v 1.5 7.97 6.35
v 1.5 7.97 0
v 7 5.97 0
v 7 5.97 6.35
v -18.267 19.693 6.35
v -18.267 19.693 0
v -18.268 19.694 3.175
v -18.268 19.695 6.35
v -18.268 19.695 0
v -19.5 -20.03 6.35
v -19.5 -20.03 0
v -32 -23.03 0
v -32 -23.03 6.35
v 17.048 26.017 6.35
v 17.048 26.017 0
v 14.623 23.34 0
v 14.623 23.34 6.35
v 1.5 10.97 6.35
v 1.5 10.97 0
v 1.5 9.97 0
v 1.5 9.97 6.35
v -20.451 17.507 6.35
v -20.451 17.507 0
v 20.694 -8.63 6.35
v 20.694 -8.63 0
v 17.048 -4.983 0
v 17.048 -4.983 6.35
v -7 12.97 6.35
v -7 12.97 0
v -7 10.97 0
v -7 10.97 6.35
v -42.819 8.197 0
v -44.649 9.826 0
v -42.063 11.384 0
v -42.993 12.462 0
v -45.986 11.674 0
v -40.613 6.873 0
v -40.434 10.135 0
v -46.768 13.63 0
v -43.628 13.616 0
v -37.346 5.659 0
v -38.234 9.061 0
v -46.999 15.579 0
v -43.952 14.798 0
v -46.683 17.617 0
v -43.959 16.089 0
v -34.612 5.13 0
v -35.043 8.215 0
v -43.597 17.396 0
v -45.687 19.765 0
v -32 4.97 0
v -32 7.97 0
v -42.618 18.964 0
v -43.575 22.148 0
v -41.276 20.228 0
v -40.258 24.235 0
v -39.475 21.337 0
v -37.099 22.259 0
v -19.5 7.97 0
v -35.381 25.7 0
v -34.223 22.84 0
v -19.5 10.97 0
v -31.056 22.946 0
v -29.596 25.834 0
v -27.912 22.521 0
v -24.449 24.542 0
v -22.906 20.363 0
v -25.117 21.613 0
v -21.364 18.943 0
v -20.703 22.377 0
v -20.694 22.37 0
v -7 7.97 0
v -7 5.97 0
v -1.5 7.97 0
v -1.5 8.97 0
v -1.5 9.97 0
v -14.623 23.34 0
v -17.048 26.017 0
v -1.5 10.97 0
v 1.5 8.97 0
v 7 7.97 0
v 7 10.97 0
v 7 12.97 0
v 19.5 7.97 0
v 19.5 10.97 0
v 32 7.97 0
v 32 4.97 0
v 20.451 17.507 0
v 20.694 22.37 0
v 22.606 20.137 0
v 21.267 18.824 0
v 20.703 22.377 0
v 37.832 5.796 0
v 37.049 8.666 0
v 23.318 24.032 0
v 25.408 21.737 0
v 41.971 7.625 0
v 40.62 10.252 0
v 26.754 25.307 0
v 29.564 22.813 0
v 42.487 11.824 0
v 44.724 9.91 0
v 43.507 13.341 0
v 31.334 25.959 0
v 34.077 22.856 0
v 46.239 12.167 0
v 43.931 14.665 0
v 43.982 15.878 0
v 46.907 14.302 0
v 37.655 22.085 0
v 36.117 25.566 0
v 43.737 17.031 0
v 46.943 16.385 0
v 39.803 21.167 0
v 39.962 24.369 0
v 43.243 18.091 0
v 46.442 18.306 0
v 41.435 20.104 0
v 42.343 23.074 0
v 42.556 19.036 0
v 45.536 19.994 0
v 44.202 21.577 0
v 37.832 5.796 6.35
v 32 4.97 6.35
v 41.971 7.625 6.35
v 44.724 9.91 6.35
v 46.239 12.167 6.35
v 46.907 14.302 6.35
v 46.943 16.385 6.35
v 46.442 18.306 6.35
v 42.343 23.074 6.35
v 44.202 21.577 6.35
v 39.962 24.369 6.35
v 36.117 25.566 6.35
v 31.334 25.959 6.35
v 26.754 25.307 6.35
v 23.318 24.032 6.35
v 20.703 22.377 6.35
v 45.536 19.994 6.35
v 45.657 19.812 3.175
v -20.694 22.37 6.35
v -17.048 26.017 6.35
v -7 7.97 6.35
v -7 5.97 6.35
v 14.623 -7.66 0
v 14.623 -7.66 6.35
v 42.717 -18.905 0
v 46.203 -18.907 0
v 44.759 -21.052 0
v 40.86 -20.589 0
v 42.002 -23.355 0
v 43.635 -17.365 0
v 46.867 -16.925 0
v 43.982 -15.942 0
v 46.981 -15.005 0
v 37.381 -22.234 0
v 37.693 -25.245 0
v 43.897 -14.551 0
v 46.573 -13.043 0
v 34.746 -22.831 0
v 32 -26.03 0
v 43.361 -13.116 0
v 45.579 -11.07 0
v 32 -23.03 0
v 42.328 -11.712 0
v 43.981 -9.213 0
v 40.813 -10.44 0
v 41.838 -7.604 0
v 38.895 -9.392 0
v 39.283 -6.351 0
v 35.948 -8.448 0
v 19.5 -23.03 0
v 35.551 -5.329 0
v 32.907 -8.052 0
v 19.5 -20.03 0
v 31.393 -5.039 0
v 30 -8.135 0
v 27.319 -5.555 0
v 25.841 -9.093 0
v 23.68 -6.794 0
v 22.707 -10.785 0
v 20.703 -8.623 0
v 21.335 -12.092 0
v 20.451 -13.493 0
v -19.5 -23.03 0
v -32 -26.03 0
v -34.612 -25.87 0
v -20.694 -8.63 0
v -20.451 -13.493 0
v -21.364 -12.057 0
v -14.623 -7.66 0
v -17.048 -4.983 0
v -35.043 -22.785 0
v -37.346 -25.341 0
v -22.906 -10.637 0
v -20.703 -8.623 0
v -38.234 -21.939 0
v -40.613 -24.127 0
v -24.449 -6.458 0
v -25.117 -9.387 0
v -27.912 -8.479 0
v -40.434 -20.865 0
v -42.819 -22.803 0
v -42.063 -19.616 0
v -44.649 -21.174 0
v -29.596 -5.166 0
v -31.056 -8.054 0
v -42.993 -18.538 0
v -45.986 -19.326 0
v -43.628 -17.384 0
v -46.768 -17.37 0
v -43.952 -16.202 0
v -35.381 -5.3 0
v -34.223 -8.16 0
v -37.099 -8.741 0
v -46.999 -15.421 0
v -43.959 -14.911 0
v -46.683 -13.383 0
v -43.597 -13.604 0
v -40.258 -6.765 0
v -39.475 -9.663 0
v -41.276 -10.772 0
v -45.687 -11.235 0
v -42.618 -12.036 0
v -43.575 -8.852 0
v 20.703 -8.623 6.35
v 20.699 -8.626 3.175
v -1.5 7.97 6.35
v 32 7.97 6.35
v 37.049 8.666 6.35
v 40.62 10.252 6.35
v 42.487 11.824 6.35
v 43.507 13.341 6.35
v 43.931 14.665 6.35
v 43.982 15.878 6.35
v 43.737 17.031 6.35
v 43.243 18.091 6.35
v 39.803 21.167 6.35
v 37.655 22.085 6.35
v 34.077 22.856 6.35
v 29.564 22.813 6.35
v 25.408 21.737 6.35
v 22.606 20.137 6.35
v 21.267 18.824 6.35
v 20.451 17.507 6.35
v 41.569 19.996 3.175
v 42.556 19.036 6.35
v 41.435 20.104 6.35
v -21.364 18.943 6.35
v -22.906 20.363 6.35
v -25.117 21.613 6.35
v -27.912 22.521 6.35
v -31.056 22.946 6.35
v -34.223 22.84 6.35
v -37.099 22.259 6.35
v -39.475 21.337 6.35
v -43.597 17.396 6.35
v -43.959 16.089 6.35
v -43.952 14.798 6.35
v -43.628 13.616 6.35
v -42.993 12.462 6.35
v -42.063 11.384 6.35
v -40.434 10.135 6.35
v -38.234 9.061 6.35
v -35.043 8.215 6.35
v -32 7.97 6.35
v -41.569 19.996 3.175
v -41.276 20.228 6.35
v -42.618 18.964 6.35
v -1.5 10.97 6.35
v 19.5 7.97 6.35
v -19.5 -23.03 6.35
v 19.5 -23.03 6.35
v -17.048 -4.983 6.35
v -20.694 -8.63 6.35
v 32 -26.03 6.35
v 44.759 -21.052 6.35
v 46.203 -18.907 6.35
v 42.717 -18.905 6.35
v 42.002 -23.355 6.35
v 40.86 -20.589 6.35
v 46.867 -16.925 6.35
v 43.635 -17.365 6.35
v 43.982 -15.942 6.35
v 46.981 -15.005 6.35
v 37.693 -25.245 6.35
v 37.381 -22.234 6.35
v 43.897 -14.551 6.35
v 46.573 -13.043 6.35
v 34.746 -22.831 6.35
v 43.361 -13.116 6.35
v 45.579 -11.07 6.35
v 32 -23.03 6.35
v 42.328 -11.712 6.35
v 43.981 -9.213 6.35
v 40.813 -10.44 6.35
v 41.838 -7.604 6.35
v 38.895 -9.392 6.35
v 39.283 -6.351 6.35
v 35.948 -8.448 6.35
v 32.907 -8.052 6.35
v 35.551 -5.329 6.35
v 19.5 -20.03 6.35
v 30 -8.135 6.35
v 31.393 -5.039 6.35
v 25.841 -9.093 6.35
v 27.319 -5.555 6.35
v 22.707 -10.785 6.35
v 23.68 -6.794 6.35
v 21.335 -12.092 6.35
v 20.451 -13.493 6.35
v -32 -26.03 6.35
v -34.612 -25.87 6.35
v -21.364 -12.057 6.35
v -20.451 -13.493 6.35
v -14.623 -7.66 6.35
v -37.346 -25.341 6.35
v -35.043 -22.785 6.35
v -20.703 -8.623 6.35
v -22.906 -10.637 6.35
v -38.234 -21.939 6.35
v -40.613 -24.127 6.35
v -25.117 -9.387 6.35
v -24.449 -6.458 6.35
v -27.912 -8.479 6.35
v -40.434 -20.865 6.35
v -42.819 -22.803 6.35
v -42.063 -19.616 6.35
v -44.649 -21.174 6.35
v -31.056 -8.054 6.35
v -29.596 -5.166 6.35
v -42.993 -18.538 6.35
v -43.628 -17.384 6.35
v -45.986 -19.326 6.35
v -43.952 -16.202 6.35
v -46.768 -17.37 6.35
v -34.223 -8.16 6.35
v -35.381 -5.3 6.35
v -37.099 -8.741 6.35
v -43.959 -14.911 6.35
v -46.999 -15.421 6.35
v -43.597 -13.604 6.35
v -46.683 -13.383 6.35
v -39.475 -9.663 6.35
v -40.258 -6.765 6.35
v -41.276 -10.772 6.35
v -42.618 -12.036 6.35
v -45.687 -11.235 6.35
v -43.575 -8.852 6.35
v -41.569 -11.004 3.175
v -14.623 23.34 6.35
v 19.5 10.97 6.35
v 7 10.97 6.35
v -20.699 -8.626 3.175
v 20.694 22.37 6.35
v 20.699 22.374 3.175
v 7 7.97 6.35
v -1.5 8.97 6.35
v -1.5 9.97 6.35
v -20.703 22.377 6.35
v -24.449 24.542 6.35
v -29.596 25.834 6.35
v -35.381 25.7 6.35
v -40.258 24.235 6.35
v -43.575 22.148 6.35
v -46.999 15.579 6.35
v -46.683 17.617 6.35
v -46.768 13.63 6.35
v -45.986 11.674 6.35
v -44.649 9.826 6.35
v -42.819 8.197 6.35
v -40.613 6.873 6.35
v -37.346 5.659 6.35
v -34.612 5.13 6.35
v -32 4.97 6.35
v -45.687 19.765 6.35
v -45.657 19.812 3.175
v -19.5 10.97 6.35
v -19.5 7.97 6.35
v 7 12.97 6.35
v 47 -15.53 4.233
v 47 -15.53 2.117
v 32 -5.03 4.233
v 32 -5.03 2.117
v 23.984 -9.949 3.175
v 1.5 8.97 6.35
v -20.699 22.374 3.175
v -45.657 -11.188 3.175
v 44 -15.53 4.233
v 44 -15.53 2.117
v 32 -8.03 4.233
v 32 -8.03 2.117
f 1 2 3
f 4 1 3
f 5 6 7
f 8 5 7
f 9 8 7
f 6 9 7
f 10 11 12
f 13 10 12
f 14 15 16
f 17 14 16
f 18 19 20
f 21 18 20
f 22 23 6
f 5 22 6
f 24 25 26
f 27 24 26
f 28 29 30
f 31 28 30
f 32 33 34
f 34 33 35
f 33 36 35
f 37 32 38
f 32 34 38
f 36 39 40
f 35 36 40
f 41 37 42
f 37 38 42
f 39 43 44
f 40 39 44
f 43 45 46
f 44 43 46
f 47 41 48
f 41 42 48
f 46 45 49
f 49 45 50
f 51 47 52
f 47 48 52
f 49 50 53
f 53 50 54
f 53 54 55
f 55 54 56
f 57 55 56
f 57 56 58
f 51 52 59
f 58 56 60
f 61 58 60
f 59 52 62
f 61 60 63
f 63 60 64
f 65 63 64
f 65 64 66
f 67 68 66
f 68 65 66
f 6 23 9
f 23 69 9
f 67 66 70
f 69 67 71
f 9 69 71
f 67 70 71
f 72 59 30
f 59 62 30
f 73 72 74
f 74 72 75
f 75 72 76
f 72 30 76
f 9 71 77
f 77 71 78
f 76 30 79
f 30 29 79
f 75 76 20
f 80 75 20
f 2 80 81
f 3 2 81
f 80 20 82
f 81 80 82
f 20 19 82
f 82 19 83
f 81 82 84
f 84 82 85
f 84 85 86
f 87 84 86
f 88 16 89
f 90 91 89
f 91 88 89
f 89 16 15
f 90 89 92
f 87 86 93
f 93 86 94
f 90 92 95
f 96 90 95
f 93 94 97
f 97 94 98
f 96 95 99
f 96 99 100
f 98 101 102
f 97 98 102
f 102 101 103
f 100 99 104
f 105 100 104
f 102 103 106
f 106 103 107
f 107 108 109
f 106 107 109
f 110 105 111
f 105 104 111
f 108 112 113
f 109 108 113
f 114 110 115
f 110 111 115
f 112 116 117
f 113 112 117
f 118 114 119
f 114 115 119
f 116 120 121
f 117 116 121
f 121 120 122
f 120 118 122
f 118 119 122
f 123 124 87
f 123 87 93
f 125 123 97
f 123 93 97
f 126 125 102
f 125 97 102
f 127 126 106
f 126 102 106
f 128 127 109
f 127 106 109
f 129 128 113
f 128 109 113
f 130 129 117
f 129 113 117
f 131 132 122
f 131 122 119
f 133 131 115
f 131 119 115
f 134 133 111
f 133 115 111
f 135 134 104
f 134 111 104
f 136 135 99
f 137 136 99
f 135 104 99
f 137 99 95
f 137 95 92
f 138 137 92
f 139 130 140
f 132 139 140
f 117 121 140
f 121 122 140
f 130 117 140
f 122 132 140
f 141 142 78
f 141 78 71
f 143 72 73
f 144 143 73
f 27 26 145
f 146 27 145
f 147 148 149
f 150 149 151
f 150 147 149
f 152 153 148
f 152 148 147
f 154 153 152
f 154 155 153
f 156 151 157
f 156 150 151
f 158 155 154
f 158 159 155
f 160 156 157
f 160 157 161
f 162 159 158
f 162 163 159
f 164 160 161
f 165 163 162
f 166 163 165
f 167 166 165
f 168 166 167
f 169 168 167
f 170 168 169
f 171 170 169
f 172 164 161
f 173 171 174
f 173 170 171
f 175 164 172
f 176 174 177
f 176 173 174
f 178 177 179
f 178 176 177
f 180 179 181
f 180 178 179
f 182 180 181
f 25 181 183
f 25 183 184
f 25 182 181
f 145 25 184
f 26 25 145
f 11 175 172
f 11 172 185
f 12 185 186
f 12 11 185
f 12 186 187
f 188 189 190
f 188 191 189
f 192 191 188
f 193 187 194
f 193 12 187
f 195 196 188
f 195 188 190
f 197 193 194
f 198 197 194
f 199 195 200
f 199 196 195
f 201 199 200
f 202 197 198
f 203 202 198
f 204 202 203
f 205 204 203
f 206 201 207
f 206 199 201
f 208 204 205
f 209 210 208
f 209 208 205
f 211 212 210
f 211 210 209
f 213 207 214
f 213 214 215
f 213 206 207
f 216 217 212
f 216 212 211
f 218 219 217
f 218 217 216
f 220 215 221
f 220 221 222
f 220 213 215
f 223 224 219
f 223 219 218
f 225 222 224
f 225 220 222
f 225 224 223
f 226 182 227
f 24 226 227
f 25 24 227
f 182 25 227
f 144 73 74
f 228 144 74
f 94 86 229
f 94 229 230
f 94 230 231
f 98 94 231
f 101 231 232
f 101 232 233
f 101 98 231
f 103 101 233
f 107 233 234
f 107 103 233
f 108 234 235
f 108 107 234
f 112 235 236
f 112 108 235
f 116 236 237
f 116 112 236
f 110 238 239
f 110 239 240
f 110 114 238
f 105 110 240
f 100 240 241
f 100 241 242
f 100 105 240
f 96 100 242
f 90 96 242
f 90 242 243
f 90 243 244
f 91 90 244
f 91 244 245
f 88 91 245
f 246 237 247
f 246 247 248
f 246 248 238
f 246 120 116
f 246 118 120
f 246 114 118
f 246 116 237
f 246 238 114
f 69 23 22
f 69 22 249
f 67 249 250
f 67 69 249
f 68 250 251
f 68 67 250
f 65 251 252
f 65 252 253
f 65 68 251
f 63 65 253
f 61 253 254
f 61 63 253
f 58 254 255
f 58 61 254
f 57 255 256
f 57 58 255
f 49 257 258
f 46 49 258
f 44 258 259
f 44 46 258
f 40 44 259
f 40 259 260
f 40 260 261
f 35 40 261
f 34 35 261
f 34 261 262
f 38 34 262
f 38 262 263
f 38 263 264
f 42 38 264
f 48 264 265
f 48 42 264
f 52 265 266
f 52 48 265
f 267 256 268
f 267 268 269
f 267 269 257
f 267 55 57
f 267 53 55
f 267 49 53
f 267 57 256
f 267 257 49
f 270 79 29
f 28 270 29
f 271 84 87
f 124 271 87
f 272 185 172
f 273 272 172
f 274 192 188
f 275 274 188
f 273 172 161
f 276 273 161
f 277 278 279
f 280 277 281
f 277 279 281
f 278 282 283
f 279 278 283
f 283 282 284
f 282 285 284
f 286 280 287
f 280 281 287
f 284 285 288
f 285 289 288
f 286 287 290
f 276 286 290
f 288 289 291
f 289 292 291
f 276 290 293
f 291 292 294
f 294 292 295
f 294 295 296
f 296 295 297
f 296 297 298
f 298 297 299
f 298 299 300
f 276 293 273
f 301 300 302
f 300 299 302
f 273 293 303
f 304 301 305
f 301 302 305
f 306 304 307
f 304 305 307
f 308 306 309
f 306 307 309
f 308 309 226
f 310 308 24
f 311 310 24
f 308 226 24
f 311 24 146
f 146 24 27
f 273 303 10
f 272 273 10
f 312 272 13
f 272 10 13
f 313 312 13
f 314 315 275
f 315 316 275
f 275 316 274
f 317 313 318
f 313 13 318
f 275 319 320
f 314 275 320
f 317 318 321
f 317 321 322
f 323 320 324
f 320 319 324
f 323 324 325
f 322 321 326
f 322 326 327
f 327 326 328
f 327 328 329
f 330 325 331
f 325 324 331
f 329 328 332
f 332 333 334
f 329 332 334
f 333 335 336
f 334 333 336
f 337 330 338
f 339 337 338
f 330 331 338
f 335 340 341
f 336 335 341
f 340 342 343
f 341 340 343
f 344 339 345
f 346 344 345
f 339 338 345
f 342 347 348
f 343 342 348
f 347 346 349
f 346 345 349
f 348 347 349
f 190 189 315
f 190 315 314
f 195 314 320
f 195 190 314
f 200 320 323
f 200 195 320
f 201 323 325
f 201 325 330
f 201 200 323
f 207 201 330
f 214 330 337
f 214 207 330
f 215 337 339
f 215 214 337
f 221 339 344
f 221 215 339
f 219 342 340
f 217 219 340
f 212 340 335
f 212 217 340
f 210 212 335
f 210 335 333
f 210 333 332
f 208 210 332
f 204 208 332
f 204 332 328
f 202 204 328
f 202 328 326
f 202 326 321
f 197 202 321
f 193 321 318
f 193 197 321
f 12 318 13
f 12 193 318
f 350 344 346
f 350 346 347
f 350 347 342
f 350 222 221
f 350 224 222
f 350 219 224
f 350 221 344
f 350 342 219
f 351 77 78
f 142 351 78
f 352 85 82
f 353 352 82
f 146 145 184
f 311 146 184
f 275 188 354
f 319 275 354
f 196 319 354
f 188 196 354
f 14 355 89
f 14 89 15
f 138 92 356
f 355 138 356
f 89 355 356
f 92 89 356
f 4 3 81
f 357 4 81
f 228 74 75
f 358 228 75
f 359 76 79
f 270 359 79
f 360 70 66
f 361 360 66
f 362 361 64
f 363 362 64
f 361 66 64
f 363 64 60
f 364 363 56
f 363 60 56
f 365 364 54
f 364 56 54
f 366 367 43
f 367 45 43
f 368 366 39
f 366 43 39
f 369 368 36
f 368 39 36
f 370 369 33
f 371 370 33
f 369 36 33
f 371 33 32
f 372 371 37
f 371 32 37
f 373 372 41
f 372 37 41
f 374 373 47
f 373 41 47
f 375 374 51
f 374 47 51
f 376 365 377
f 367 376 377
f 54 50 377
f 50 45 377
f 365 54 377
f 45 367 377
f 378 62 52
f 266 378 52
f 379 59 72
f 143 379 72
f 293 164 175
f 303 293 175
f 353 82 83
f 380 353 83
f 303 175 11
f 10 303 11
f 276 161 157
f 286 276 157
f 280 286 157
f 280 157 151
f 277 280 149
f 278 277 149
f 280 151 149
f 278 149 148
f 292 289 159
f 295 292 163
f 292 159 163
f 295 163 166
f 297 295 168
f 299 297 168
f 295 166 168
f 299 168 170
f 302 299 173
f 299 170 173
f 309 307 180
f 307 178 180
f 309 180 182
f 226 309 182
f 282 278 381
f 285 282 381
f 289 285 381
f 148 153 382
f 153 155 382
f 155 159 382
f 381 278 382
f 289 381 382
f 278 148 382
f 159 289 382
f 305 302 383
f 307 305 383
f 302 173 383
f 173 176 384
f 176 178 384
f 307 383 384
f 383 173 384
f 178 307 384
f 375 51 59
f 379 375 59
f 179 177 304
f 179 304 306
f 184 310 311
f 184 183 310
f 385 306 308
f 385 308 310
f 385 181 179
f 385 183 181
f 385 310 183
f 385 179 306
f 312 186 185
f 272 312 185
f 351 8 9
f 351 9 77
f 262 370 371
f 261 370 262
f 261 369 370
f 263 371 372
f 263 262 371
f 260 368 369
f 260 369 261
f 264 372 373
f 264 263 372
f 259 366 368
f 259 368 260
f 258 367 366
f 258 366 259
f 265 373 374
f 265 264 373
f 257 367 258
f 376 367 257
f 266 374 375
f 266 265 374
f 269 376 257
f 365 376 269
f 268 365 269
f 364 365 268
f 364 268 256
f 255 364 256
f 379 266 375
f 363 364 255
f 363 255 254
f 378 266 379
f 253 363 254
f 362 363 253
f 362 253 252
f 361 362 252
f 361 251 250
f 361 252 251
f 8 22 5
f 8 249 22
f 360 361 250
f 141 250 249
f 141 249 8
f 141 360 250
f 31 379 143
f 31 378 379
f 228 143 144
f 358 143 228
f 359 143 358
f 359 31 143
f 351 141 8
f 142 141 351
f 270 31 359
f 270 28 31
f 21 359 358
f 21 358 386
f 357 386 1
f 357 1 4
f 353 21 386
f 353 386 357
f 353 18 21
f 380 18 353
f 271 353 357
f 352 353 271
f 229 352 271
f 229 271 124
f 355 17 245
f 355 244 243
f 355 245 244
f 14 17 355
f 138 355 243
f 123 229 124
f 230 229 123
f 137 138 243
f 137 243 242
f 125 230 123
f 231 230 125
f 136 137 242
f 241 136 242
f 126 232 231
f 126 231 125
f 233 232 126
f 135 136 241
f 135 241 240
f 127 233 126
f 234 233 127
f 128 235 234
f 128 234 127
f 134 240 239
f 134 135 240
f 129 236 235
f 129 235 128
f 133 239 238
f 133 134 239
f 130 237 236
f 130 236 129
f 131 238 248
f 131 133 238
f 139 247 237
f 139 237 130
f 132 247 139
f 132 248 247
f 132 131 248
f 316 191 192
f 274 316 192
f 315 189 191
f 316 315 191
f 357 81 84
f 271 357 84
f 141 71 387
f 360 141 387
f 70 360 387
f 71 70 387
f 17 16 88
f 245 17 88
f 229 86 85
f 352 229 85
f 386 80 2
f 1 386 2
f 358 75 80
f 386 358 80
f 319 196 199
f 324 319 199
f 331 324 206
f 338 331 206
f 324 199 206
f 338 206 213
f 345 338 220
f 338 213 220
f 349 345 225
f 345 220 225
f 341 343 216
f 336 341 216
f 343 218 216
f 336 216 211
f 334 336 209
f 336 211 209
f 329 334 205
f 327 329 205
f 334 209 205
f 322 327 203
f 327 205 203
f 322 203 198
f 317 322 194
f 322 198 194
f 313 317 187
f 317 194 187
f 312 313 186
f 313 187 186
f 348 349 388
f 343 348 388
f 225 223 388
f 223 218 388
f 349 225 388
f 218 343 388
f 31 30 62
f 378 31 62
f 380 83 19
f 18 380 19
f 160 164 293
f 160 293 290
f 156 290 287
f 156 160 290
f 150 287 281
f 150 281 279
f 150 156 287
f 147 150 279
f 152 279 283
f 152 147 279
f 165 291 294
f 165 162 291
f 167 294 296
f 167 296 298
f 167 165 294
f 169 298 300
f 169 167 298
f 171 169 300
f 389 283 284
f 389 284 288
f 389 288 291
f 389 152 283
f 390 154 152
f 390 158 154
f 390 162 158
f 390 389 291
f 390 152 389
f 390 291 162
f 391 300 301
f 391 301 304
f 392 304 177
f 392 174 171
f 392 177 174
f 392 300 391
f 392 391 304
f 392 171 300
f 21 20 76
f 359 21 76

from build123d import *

# Parameters (mm, degrees)
F1_DEPTH = 6.35
F2_DEPTH = 6.35


# Not quite as in the source:
# - ends of sketch curves that miss each other by under 0.0002 mm in the source are joined


with BuildPart() as f1:
    # F0 (on Top) → F1 (new body)
    with BuildSketch(Plane.XY):
        with BuildLine():
            add(Edge.make_bspline(
                [(-20.4512735689, -13.4928953942), (-27.006583317, 1.0216576775), (-41.568666167, -11.0043361613), (-56.130749017, -23.03033), (-32, -23.03033)],
                knots=[3.416708, 3.416708, 3.416708, 5.635344817, 5.635344817, 7.853981634, 7.853981634, 7.853981634], degree=2, weights=[1, 0.445271914, 1, 0.445271914, 1]))
            Line((-20.4512735689, -13.4928953942), (-14.623441, -7.659787))
            Line((-14.623441, -7.659787), (-17.0484084715, -4.9831928082))
            Line((-17.0484084715, -4.9831928082), (-20.6942287896, -8.6297607204))
            add(Edge.make_bspline(
                [(-20.6942287896, -8.6297607204), (-20.698607878, -8.6262451494), (-20.7029914266, -8.6227323031)],
                knots=[3.8586865618, 3.8586865618, 3.8586865618, 3.859575, 3.859575, 3.859575], degree=2, weights=[1, 0.9999999013, 1]))
            add(Edge.make_bspline(
                [(-20.7029914266, -8.6227323031), (-36.0243090451, 3.6553185791), (-45.6568538904, -11.1875086941), (-55.2893987358, -26.0303359672), (-31.9999945096, -26.03033)],
                knots=[3.859575, 3.859575, 3.859575, 5.8567785, 5.8567785, 7.853982, 7.853982, 7.853982], degree=2, weights=[1, 0.5414783641, 1, 0.5414783641, 1]))
            Line((-31.9999945096, -26.03033), (-19.5, -23.03033))
            Line((-19.5, -23.03033), (0, -23.03033))
            Line((0, -23.03033), (19.5, -23.03033))
            Line((19.5, -23.03033), (32, -26.03033))
            add(Edge.make_bspline(
                [(32, -26.03033), (46.9999832548, -26.0303338433), (46.999986, -15.5303319216), (46.9999887452, -5.03033), (32, -5.03033)],
                knots=[4.7123886144, 4.7123886144, 4.7123886144, 6.2831851242, 6.2831851242, 7.853981634, 7.853981634, 7.853981634], degree=2, weights=[1, 0.7071067165, 1, 0.7071067165, 1]))
            add(Edge.make_bspline(
                [(32, -5.03033), (25.1858150627, -5.03033), (20.7029914266, -8.6227323031)],
                knots=[1.5707963268, 1.5707963268, 1.5707963268, 2.4236103072, 2.4236103072, 2.4236103072], degree=2, weights=[1, 0.9104577001, 1]))
            add(Edge.make_bspline(
                [(20.7029914266, -8.6227323031), (20.698607878, -8.6262451494), (20.6942287896, -8.6297607204)],
                knots=[2.4236103072, 2.4236103072, 2.4236103072, 2.4244987453, 2.4244987453, 2.4244987453], degree=2, weights=[1, 0.9999999013, 1]))
            Line((20.6942287896, -8.6297607204), (17.0484127896, -4.9831967204))
            Line((17.0484127896, -4.9831967204), (14.623441, -7.659787))
            Line((14.623441, -7.659787), (20.4512735689, -13.4928953942))
            add(Edge.make_bspline(
                [(30.0004237684, -8.1351855073), (22.5138875018, -8.9259228869), (20.4512735689, -13.4928953942)],
                knots=[1.7382085912, 1.7382085912, 1.7382085912, 2.8664773072, 2.8664773072, 2.8664773072], degree=2, weights=[1, 0.8450517623, 1]))
            add(Edge.make_bspline(
                [(32, -8.03033), (30.9931737994, -8.03033), (30.0004237684, -8.1351855073)],
                knots=[1.5707963268, 1.5707963268, 1.5707963268, 1.7382085912, 1.7382085912, 1.7382085912], degree=2, weights=[1, 0.9964986868, 1]))
            add(Edge.make_bspline(
                [(32, -23.03033), (44, -23.03033), (44, -15.53033), (44, -8.03033), (32, -8.03033)],
                knots=[4.7123889804, 4.7123889804, 4.7123889804, 6.2831853072, 6.2831853072, 7.853981634, 7.853981634, 7.853981634], degree=2, weights=[1, 0.7071067812, 1, 0.7071067812, 1]))
            Line((32, -23.03033), (19.5000043923, -20.03033))
            Line((19.5000043923, -20.03033), (0, -20.03033))
            Line((0, -20.03033), (-19.5, -20.03033))
            Line((-19.5, -20.03033), (-32, -23.03033))
        make_face()
    extrude(amount=F1_DEPTH)


with BuildPart() as f2:
    # F0 (on Top) → F2 (new body)
    with BuildSketch(Plane.XY):
        with BuildLine():
            add(Edge.make_bspline(
                [(-18.2670631482, 19.6932923503), (-18.2676990936, 19.69430555), (-18.2683353441, 19.6953186559)],
                knots=[3.5555654943, 3.5555654943, 3.5555654943, 3.5557762907, 3.5557762907, 3.5557762907], degree=2, weights=[1, 0.9999999944, 1]))
            Line((-18.2683353441, 19.6953186559), (-14.623441, 23.340213))
            Line((-14.623441, 23.340213), (-17.0484127896, 26.0168032796))
            Line((-17.0484127896, 26.0168032796), (-20.6942287896, 22.3702392796))
            add(Edge.make_bspline(
                [(-20.6942287896, 22.3702392796), (-20.698607878, 22.3737548506), (-20.7029914266, 22.3772676969)],
                knots=[3.8586865618, 3.8586865618, 3.8586865618, 3.859575, 3.859575, 3.859575], degree=2, weights=[1, 0.9999999013, 1]))
            add(Edge.make_bspline(
                [(-20.7029914266, 22.3772676969), (-36.0243090451, 34.6553185791), (-45.6568538904, 19.8124913059), (-55.2893987358, 4.9696640328), (-31.9999945096, 4.96967)],
                knots=[3.859575, 3.859575, 3.859575, 5.8567785, 5.8567785, 7.853982, 7.853982, 7.853982], degree=2, weights=[1, 0.5414783641, 1, 0.5414783641, 1]))
            Line((-31.9999945096, 4.96967), (-19.5, 7.96967))
            Line((-19.5, 7.96967), (-7, 7.96967))
            Line((-7, 7.96967), (-7, 5.96967))
            Line((-7, 5.96967), (-1.5, 7.96967))
            Line((-1.5, 7.96967), (-1.5, 8.96967))
            Line((-1.5, 8.96967), (0, 8.96967))
            Line((0, 8.96967), (1.5, 8.96967))
            Line((1.5, 8.96967), (1.5, 7.96967))
            Line((1.5, 7.96967), (7, 5.96967))
            Line((7, 5.96967), (7, 7.96967))
            Line((7, 7.96967), (19.5, 7.96967))
            Line((19.5, 7.96967), (32, 4.96967))
            add(Edge.make_bspline(
                [(32, 4.96967), (55.2893995447, 4.96967), (45.656852755, 19.8124930555), (36.0243059653, 34.655316111), (20.7029914266, 22.3772676969)],
                knots=[4.7123889804, 4.7123889804, 4.7123889804, 6.7095922974, 6.7095922974, 8.7067956144, 8.7067956144, 8.7067956144], degree=2, weights=[1, 0.541478441, 1, 0.541478441, 1]))
            add(Edge.make_bspline(
                [(20.7029914266, 22.3772676969), (20.698607878, 22.3737548506), (20.6942287896, 22.3702392796)],
                knots=[2.4236103072, 2.4236103072, 2.4236103072, 2.4244987453, 2.4244987453, 2.4244987453], degree=2, weights=[1, 0.9999999013, 1]))
            Line((20.6942287896, 22.3702392796), (17.0484127896, 26.0168032796))
            Line((17.0484127896, 26.0168032796), (14.6234453181, 23.3402090878))
            Line((14.6234453181, 23.3402090878), (20.4512735689, 17.5071046058))
            add(Edge.make_bspline(
                [(32, 7.96967), (56.130749017, 7.96967), (41.568666167, 19.9956638387), (27.006583317, 32.0216576775), (20.4512735689, 17.5071046058)],
                knots=[4.7123889804, 4.7123889804, 4.7123889804, 6.9310257974, 6.9310257974, 9.1496626144, 9.1496626144, 9.1496626144], degree=2, weights=[1, 0.445271914, 1, 0.445271914, 1]))
            Line((32, 7.96967), (19.5, 10.96967))
            Line((19.5, 10.96967), (7, 10.96967))
            Line((7, 10.96967), (7, 12.96967))
            Line((7, 12.96967), (1.5, 10.96967))
            Line((1.5, 10.96967), (1.5, 9.96967))
            Line((1.5, 9.96967), (0, 9.96967))
            Line((0, 9.96967), (-1.5, 9.96967))
            Line((-1.5, 9.96967), (-1.5, 10.96967))
            Line((-1.5, 10.96967), (-7, 12.96967))
            Line((-7, 12.96967), (-7, 10.96967))
            Line((-7, 10.96967), (-19.5, 10.96967))
            Line((-19.5, 10.96967), (-32, 7.96967))
            add(Edge.make_bspline(
                [(-20.4512735689, 17.5071046058), (-27.006583317, 32.0216576775), (-41.568666167, 19.9956638387), (-56.130749017, 7.96967), (-32, 7.96967)],
                knots=[3.416708, 3.416708, 3.416708, 5.635344817, 5.635344817, 7.853981634, 7.853981634, 7.853981634], degree=2, weights=[1, 0.445271914, 1, 0.445271914, 1]))
            Line((-20.4512735689, 17.5071046058), (-18.2670631482, 19.6932923503))
        make_face()
    extrude(amount=F2_DEPTH)


solid = Compound([f1.part, f2.part])
